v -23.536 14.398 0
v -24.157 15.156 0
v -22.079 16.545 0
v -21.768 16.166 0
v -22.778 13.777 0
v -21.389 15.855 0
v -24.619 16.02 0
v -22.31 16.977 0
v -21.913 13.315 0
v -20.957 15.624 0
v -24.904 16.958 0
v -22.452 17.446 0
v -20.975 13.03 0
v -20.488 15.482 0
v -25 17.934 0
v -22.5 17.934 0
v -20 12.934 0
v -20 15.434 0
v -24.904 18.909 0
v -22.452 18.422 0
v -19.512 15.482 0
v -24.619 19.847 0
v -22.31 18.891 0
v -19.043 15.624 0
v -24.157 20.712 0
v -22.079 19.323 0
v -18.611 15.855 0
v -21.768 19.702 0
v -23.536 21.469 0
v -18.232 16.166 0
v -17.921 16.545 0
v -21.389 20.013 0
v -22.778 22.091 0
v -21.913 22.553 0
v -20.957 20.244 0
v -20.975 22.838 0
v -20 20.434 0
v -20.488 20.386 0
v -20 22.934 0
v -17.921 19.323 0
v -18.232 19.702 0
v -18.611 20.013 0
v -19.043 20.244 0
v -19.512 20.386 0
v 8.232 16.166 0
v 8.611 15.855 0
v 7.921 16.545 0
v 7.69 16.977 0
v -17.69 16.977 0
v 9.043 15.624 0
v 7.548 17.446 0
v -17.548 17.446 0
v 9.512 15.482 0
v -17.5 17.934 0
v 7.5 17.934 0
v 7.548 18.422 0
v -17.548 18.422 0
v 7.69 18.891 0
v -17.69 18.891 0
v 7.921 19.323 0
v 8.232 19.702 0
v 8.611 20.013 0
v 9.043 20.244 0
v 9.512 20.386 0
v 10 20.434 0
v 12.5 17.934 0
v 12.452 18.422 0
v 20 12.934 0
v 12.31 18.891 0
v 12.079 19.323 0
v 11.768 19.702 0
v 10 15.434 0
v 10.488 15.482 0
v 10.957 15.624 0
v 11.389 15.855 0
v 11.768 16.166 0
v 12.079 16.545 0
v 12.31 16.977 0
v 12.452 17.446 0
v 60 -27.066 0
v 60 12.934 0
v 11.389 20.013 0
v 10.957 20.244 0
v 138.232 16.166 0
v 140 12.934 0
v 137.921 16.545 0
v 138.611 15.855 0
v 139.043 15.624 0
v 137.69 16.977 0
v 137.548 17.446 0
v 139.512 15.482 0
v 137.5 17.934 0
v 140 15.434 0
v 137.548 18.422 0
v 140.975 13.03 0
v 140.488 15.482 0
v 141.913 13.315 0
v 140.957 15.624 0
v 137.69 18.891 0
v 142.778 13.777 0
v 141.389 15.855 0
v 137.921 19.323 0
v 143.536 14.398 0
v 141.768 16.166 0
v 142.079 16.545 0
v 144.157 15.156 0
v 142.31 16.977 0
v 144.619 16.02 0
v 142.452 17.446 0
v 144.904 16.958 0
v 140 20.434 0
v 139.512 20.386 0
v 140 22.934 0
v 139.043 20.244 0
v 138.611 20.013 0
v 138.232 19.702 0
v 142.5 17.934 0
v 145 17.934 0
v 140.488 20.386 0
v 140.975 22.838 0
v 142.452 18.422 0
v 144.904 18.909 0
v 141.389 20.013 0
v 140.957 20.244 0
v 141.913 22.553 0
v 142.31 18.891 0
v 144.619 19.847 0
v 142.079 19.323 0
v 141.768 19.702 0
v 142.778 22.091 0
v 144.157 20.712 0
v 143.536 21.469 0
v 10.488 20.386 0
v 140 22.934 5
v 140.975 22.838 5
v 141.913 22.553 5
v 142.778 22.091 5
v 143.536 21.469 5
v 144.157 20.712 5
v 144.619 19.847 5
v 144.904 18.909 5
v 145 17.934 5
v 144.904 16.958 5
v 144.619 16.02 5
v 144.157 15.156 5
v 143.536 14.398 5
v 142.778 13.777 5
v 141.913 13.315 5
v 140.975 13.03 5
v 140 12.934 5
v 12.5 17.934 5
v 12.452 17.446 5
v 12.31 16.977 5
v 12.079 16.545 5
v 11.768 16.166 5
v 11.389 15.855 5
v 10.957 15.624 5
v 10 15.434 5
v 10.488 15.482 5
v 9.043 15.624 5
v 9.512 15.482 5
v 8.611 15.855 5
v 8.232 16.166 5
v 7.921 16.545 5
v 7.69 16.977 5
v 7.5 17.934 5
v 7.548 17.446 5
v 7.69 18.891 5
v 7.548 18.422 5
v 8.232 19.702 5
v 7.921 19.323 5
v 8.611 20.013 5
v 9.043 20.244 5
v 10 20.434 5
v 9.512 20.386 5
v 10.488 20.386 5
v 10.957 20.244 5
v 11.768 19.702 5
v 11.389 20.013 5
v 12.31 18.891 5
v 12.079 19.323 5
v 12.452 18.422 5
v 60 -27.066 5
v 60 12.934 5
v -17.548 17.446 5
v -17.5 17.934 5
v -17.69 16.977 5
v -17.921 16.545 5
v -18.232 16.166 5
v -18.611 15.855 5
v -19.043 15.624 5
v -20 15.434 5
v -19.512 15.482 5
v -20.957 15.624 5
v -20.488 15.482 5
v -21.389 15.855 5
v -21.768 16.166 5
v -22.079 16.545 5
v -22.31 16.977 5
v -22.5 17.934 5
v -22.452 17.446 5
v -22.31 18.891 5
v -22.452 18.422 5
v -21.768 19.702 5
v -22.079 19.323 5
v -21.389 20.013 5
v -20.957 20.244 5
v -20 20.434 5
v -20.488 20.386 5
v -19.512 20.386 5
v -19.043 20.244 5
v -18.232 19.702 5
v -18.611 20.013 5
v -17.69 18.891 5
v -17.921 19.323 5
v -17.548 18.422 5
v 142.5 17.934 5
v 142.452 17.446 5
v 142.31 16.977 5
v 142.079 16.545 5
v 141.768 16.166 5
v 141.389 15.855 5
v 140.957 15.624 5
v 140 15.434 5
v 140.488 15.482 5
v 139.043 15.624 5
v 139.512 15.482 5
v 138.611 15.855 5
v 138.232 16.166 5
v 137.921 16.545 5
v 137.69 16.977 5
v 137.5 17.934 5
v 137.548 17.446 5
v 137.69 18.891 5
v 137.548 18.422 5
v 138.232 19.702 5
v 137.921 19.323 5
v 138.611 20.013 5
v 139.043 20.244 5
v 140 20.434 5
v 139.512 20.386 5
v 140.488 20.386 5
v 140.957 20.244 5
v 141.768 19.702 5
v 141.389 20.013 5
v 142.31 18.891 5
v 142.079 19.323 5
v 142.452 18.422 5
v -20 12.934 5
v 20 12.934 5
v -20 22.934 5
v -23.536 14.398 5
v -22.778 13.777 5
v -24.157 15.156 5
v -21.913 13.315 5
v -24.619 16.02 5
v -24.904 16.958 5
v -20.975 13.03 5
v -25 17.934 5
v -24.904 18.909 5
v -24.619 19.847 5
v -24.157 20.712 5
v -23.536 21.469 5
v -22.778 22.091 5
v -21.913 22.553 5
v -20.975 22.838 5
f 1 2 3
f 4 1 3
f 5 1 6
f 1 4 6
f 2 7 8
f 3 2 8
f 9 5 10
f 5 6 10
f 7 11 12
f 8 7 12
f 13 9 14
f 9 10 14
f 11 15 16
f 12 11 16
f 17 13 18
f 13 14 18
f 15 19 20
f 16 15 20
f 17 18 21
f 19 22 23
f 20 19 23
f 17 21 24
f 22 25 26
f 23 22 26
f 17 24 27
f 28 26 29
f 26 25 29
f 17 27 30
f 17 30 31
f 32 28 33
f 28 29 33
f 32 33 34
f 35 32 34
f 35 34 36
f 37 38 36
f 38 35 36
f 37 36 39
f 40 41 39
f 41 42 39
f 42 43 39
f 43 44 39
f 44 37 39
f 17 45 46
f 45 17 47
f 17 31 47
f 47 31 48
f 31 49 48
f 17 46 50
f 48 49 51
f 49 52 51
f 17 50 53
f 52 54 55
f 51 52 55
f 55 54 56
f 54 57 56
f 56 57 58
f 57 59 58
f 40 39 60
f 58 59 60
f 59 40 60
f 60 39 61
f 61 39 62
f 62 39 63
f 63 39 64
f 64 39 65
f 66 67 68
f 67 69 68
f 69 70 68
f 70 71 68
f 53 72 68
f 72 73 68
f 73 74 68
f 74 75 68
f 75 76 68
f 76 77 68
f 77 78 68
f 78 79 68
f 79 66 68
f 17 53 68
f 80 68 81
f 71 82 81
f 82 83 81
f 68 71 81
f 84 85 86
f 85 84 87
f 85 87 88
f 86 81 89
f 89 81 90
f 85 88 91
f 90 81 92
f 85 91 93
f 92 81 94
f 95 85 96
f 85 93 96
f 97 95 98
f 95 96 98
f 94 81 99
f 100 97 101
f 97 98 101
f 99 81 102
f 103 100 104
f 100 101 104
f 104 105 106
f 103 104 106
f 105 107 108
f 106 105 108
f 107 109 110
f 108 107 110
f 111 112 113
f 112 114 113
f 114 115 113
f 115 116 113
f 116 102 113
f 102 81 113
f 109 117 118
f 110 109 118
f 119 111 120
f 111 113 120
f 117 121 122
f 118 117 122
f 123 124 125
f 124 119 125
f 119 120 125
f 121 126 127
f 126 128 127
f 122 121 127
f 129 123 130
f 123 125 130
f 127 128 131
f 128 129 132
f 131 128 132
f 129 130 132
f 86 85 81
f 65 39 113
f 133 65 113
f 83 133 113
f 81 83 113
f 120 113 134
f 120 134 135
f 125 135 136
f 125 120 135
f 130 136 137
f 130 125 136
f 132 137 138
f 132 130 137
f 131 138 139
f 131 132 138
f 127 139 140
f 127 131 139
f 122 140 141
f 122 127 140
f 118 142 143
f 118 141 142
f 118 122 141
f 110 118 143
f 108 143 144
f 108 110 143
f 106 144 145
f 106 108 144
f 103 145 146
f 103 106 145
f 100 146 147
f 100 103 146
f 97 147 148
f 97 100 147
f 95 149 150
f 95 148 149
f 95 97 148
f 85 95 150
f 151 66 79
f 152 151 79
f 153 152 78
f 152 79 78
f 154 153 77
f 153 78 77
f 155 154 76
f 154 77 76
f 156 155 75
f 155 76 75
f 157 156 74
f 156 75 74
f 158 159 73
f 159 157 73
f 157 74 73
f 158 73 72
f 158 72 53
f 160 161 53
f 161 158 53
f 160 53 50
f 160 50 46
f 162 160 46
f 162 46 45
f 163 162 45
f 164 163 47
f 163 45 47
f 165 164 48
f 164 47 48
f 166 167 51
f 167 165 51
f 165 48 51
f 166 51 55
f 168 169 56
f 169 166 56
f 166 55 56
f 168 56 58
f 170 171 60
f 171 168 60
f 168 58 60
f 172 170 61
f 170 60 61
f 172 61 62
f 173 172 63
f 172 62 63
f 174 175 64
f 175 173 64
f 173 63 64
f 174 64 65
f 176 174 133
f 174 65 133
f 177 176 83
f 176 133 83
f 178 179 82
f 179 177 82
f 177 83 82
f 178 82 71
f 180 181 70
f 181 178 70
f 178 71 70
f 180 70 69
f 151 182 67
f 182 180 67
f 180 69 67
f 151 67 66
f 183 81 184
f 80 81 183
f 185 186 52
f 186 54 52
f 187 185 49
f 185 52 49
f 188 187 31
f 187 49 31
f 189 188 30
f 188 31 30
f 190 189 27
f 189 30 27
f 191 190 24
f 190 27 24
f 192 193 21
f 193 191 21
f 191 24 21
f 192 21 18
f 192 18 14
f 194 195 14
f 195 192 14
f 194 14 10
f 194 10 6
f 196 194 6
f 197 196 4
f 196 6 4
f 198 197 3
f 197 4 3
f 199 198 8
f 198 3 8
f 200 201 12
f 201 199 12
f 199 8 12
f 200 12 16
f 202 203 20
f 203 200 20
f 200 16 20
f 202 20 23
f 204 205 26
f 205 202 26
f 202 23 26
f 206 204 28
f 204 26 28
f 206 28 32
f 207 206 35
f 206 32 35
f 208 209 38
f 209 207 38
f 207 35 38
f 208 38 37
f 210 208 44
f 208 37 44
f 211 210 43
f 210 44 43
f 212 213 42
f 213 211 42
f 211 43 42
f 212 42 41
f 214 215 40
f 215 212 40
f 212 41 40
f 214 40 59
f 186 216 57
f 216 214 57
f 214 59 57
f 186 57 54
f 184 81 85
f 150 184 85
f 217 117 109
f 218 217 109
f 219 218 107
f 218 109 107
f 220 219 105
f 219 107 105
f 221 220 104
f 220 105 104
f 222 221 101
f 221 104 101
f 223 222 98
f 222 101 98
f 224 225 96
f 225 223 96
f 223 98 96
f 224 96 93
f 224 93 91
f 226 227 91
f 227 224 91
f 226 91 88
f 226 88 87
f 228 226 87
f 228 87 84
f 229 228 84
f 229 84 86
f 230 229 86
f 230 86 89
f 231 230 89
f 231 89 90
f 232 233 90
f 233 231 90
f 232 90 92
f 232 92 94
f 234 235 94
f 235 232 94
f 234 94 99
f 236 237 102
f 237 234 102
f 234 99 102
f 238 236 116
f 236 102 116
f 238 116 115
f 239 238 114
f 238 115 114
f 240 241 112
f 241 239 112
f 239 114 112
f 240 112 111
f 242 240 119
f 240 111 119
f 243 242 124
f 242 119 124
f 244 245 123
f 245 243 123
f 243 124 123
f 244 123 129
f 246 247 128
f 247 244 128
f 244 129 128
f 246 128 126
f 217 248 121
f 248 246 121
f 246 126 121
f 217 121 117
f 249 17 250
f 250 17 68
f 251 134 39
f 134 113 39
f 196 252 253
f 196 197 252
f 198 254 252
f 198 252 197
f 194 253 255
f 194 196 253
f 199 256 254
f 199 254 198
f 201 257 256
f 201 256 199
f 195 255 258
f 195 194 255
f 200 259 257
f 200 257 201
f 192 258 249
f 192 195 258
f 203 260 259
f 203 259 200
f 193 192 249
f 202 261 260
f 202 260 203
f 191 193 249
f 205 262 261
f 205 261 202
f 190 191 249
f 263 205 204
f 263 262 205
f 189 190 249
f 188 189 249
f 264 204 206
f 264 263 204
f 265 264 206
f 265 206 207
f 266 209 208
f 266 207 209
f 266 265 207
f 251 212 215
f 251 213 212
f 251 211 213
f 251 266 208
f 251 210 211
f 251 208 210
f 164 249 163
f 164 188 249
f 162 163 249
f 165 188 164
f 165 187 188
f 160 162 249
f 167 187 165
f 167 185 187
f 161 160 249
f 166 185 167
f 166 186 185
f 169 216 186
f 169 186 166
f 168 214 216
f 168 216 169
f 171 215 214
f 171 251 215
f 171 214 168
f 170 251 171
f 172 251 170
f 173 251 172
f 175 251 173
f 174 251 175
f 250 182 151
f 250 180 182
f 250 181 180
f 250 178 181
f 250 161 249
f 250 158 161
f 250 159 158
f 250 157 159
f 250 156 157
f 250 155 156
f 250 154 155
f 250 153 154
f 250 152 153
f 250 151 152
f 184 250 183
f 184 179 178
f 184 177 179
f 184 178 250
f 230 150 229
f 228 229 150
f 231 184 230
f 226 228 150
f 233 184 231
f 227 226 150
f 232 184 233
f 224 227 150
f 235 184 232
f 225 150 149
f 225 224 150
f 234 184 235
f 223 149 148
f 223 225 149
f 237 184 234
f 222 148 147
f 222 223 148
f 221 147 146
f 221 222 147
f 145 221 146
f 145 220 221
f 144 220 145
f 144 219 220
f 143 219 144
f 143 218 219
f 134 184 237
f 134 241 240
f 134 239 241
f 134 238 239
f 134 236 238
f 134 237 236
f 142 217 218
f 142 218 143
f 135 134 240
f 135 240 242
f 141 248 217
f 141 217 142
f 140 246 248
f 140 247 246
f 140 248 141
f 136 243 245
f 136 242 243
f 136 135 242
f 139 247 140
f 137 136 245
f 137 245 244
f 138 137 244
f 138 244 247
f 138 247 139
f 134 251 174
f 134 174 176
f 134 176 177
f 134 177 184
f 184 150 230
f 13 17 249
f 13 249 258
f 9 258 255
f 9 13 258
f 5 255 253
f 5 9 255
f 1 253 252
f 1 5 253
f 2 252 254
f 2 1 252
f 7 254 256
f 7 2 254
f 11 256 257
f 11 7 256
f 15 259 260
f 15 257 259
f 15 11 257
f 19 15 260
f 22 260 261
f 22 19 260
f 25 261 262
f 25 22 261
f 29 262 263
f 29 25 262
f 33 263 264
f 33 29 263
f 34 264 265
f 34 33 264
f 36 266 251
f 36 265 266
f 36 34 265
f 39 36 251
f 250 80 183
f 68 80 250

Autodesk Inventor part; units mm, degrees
ref_plane "YZ Plane" through (0, 0, 0) normal (1, 0, 0) x (0, 1, 0)
ref_plane "XZ Plane" through (0, 0, 0) normal (0, 1, 0) x (-1, 0, 0)
ref_plane "XY Plane" through (0, 0, 0) normal (0, 0, 1) x (1, 0, 0)
sketch "Sketch1" plane through (0, 0, 0) normal (0, 0, 1) x (1, 0, 0)
  line L0 (-20, 17.9339) -> (140, 17.9339) construction
  line L1 (-20, 12.9339) -> (140, 12.9339)
  line L2 (140, 22.9339) -> (-20, 22.9339)
  arc A0 (-20, 22.9339) -> (-20, 12.9339) centre (-20, 17.9339) ccw
  arc A1 (140, 12.9339) -> (140, 22.9339) centre (140, 17.9339) ccw
  circle A2 centre (-20, 17.9339) radius 2.5
  circle A3 centre (140, 17.9339) radius 2.5
  circle A4 centre (10, 17.9339) radius 2.5
  line L3 (60, 12.9339) -> (60, -27.0661)
  line L4 (60, -27.0661) -> (20, 12.9339)
  point P0 (0, 0)
  point P1 (60, 17.9339)
  dimension "d0" = 10
  dimension "d1" = 5
  dimension "d2" = 160
  dimension "d7" = 30
  dimension "d10" = 45
  dimension "d11" = 40
  dimension "d12" = 80
extrude "Extrusion1" add sketch "Sketch1" along normal blind 5 contours A0 L2 A1 L1 | A3 | A4
extrude "Extrusion3" cut sketch "Sketch1" along normal up to surface (5 mm away) contours A3 | A4
extrude "Extrusion4" add sketch "Sketch1" along normal up to surface (5 mm away) contours L1 L3 L4
properties material "Copper, Alloy"
